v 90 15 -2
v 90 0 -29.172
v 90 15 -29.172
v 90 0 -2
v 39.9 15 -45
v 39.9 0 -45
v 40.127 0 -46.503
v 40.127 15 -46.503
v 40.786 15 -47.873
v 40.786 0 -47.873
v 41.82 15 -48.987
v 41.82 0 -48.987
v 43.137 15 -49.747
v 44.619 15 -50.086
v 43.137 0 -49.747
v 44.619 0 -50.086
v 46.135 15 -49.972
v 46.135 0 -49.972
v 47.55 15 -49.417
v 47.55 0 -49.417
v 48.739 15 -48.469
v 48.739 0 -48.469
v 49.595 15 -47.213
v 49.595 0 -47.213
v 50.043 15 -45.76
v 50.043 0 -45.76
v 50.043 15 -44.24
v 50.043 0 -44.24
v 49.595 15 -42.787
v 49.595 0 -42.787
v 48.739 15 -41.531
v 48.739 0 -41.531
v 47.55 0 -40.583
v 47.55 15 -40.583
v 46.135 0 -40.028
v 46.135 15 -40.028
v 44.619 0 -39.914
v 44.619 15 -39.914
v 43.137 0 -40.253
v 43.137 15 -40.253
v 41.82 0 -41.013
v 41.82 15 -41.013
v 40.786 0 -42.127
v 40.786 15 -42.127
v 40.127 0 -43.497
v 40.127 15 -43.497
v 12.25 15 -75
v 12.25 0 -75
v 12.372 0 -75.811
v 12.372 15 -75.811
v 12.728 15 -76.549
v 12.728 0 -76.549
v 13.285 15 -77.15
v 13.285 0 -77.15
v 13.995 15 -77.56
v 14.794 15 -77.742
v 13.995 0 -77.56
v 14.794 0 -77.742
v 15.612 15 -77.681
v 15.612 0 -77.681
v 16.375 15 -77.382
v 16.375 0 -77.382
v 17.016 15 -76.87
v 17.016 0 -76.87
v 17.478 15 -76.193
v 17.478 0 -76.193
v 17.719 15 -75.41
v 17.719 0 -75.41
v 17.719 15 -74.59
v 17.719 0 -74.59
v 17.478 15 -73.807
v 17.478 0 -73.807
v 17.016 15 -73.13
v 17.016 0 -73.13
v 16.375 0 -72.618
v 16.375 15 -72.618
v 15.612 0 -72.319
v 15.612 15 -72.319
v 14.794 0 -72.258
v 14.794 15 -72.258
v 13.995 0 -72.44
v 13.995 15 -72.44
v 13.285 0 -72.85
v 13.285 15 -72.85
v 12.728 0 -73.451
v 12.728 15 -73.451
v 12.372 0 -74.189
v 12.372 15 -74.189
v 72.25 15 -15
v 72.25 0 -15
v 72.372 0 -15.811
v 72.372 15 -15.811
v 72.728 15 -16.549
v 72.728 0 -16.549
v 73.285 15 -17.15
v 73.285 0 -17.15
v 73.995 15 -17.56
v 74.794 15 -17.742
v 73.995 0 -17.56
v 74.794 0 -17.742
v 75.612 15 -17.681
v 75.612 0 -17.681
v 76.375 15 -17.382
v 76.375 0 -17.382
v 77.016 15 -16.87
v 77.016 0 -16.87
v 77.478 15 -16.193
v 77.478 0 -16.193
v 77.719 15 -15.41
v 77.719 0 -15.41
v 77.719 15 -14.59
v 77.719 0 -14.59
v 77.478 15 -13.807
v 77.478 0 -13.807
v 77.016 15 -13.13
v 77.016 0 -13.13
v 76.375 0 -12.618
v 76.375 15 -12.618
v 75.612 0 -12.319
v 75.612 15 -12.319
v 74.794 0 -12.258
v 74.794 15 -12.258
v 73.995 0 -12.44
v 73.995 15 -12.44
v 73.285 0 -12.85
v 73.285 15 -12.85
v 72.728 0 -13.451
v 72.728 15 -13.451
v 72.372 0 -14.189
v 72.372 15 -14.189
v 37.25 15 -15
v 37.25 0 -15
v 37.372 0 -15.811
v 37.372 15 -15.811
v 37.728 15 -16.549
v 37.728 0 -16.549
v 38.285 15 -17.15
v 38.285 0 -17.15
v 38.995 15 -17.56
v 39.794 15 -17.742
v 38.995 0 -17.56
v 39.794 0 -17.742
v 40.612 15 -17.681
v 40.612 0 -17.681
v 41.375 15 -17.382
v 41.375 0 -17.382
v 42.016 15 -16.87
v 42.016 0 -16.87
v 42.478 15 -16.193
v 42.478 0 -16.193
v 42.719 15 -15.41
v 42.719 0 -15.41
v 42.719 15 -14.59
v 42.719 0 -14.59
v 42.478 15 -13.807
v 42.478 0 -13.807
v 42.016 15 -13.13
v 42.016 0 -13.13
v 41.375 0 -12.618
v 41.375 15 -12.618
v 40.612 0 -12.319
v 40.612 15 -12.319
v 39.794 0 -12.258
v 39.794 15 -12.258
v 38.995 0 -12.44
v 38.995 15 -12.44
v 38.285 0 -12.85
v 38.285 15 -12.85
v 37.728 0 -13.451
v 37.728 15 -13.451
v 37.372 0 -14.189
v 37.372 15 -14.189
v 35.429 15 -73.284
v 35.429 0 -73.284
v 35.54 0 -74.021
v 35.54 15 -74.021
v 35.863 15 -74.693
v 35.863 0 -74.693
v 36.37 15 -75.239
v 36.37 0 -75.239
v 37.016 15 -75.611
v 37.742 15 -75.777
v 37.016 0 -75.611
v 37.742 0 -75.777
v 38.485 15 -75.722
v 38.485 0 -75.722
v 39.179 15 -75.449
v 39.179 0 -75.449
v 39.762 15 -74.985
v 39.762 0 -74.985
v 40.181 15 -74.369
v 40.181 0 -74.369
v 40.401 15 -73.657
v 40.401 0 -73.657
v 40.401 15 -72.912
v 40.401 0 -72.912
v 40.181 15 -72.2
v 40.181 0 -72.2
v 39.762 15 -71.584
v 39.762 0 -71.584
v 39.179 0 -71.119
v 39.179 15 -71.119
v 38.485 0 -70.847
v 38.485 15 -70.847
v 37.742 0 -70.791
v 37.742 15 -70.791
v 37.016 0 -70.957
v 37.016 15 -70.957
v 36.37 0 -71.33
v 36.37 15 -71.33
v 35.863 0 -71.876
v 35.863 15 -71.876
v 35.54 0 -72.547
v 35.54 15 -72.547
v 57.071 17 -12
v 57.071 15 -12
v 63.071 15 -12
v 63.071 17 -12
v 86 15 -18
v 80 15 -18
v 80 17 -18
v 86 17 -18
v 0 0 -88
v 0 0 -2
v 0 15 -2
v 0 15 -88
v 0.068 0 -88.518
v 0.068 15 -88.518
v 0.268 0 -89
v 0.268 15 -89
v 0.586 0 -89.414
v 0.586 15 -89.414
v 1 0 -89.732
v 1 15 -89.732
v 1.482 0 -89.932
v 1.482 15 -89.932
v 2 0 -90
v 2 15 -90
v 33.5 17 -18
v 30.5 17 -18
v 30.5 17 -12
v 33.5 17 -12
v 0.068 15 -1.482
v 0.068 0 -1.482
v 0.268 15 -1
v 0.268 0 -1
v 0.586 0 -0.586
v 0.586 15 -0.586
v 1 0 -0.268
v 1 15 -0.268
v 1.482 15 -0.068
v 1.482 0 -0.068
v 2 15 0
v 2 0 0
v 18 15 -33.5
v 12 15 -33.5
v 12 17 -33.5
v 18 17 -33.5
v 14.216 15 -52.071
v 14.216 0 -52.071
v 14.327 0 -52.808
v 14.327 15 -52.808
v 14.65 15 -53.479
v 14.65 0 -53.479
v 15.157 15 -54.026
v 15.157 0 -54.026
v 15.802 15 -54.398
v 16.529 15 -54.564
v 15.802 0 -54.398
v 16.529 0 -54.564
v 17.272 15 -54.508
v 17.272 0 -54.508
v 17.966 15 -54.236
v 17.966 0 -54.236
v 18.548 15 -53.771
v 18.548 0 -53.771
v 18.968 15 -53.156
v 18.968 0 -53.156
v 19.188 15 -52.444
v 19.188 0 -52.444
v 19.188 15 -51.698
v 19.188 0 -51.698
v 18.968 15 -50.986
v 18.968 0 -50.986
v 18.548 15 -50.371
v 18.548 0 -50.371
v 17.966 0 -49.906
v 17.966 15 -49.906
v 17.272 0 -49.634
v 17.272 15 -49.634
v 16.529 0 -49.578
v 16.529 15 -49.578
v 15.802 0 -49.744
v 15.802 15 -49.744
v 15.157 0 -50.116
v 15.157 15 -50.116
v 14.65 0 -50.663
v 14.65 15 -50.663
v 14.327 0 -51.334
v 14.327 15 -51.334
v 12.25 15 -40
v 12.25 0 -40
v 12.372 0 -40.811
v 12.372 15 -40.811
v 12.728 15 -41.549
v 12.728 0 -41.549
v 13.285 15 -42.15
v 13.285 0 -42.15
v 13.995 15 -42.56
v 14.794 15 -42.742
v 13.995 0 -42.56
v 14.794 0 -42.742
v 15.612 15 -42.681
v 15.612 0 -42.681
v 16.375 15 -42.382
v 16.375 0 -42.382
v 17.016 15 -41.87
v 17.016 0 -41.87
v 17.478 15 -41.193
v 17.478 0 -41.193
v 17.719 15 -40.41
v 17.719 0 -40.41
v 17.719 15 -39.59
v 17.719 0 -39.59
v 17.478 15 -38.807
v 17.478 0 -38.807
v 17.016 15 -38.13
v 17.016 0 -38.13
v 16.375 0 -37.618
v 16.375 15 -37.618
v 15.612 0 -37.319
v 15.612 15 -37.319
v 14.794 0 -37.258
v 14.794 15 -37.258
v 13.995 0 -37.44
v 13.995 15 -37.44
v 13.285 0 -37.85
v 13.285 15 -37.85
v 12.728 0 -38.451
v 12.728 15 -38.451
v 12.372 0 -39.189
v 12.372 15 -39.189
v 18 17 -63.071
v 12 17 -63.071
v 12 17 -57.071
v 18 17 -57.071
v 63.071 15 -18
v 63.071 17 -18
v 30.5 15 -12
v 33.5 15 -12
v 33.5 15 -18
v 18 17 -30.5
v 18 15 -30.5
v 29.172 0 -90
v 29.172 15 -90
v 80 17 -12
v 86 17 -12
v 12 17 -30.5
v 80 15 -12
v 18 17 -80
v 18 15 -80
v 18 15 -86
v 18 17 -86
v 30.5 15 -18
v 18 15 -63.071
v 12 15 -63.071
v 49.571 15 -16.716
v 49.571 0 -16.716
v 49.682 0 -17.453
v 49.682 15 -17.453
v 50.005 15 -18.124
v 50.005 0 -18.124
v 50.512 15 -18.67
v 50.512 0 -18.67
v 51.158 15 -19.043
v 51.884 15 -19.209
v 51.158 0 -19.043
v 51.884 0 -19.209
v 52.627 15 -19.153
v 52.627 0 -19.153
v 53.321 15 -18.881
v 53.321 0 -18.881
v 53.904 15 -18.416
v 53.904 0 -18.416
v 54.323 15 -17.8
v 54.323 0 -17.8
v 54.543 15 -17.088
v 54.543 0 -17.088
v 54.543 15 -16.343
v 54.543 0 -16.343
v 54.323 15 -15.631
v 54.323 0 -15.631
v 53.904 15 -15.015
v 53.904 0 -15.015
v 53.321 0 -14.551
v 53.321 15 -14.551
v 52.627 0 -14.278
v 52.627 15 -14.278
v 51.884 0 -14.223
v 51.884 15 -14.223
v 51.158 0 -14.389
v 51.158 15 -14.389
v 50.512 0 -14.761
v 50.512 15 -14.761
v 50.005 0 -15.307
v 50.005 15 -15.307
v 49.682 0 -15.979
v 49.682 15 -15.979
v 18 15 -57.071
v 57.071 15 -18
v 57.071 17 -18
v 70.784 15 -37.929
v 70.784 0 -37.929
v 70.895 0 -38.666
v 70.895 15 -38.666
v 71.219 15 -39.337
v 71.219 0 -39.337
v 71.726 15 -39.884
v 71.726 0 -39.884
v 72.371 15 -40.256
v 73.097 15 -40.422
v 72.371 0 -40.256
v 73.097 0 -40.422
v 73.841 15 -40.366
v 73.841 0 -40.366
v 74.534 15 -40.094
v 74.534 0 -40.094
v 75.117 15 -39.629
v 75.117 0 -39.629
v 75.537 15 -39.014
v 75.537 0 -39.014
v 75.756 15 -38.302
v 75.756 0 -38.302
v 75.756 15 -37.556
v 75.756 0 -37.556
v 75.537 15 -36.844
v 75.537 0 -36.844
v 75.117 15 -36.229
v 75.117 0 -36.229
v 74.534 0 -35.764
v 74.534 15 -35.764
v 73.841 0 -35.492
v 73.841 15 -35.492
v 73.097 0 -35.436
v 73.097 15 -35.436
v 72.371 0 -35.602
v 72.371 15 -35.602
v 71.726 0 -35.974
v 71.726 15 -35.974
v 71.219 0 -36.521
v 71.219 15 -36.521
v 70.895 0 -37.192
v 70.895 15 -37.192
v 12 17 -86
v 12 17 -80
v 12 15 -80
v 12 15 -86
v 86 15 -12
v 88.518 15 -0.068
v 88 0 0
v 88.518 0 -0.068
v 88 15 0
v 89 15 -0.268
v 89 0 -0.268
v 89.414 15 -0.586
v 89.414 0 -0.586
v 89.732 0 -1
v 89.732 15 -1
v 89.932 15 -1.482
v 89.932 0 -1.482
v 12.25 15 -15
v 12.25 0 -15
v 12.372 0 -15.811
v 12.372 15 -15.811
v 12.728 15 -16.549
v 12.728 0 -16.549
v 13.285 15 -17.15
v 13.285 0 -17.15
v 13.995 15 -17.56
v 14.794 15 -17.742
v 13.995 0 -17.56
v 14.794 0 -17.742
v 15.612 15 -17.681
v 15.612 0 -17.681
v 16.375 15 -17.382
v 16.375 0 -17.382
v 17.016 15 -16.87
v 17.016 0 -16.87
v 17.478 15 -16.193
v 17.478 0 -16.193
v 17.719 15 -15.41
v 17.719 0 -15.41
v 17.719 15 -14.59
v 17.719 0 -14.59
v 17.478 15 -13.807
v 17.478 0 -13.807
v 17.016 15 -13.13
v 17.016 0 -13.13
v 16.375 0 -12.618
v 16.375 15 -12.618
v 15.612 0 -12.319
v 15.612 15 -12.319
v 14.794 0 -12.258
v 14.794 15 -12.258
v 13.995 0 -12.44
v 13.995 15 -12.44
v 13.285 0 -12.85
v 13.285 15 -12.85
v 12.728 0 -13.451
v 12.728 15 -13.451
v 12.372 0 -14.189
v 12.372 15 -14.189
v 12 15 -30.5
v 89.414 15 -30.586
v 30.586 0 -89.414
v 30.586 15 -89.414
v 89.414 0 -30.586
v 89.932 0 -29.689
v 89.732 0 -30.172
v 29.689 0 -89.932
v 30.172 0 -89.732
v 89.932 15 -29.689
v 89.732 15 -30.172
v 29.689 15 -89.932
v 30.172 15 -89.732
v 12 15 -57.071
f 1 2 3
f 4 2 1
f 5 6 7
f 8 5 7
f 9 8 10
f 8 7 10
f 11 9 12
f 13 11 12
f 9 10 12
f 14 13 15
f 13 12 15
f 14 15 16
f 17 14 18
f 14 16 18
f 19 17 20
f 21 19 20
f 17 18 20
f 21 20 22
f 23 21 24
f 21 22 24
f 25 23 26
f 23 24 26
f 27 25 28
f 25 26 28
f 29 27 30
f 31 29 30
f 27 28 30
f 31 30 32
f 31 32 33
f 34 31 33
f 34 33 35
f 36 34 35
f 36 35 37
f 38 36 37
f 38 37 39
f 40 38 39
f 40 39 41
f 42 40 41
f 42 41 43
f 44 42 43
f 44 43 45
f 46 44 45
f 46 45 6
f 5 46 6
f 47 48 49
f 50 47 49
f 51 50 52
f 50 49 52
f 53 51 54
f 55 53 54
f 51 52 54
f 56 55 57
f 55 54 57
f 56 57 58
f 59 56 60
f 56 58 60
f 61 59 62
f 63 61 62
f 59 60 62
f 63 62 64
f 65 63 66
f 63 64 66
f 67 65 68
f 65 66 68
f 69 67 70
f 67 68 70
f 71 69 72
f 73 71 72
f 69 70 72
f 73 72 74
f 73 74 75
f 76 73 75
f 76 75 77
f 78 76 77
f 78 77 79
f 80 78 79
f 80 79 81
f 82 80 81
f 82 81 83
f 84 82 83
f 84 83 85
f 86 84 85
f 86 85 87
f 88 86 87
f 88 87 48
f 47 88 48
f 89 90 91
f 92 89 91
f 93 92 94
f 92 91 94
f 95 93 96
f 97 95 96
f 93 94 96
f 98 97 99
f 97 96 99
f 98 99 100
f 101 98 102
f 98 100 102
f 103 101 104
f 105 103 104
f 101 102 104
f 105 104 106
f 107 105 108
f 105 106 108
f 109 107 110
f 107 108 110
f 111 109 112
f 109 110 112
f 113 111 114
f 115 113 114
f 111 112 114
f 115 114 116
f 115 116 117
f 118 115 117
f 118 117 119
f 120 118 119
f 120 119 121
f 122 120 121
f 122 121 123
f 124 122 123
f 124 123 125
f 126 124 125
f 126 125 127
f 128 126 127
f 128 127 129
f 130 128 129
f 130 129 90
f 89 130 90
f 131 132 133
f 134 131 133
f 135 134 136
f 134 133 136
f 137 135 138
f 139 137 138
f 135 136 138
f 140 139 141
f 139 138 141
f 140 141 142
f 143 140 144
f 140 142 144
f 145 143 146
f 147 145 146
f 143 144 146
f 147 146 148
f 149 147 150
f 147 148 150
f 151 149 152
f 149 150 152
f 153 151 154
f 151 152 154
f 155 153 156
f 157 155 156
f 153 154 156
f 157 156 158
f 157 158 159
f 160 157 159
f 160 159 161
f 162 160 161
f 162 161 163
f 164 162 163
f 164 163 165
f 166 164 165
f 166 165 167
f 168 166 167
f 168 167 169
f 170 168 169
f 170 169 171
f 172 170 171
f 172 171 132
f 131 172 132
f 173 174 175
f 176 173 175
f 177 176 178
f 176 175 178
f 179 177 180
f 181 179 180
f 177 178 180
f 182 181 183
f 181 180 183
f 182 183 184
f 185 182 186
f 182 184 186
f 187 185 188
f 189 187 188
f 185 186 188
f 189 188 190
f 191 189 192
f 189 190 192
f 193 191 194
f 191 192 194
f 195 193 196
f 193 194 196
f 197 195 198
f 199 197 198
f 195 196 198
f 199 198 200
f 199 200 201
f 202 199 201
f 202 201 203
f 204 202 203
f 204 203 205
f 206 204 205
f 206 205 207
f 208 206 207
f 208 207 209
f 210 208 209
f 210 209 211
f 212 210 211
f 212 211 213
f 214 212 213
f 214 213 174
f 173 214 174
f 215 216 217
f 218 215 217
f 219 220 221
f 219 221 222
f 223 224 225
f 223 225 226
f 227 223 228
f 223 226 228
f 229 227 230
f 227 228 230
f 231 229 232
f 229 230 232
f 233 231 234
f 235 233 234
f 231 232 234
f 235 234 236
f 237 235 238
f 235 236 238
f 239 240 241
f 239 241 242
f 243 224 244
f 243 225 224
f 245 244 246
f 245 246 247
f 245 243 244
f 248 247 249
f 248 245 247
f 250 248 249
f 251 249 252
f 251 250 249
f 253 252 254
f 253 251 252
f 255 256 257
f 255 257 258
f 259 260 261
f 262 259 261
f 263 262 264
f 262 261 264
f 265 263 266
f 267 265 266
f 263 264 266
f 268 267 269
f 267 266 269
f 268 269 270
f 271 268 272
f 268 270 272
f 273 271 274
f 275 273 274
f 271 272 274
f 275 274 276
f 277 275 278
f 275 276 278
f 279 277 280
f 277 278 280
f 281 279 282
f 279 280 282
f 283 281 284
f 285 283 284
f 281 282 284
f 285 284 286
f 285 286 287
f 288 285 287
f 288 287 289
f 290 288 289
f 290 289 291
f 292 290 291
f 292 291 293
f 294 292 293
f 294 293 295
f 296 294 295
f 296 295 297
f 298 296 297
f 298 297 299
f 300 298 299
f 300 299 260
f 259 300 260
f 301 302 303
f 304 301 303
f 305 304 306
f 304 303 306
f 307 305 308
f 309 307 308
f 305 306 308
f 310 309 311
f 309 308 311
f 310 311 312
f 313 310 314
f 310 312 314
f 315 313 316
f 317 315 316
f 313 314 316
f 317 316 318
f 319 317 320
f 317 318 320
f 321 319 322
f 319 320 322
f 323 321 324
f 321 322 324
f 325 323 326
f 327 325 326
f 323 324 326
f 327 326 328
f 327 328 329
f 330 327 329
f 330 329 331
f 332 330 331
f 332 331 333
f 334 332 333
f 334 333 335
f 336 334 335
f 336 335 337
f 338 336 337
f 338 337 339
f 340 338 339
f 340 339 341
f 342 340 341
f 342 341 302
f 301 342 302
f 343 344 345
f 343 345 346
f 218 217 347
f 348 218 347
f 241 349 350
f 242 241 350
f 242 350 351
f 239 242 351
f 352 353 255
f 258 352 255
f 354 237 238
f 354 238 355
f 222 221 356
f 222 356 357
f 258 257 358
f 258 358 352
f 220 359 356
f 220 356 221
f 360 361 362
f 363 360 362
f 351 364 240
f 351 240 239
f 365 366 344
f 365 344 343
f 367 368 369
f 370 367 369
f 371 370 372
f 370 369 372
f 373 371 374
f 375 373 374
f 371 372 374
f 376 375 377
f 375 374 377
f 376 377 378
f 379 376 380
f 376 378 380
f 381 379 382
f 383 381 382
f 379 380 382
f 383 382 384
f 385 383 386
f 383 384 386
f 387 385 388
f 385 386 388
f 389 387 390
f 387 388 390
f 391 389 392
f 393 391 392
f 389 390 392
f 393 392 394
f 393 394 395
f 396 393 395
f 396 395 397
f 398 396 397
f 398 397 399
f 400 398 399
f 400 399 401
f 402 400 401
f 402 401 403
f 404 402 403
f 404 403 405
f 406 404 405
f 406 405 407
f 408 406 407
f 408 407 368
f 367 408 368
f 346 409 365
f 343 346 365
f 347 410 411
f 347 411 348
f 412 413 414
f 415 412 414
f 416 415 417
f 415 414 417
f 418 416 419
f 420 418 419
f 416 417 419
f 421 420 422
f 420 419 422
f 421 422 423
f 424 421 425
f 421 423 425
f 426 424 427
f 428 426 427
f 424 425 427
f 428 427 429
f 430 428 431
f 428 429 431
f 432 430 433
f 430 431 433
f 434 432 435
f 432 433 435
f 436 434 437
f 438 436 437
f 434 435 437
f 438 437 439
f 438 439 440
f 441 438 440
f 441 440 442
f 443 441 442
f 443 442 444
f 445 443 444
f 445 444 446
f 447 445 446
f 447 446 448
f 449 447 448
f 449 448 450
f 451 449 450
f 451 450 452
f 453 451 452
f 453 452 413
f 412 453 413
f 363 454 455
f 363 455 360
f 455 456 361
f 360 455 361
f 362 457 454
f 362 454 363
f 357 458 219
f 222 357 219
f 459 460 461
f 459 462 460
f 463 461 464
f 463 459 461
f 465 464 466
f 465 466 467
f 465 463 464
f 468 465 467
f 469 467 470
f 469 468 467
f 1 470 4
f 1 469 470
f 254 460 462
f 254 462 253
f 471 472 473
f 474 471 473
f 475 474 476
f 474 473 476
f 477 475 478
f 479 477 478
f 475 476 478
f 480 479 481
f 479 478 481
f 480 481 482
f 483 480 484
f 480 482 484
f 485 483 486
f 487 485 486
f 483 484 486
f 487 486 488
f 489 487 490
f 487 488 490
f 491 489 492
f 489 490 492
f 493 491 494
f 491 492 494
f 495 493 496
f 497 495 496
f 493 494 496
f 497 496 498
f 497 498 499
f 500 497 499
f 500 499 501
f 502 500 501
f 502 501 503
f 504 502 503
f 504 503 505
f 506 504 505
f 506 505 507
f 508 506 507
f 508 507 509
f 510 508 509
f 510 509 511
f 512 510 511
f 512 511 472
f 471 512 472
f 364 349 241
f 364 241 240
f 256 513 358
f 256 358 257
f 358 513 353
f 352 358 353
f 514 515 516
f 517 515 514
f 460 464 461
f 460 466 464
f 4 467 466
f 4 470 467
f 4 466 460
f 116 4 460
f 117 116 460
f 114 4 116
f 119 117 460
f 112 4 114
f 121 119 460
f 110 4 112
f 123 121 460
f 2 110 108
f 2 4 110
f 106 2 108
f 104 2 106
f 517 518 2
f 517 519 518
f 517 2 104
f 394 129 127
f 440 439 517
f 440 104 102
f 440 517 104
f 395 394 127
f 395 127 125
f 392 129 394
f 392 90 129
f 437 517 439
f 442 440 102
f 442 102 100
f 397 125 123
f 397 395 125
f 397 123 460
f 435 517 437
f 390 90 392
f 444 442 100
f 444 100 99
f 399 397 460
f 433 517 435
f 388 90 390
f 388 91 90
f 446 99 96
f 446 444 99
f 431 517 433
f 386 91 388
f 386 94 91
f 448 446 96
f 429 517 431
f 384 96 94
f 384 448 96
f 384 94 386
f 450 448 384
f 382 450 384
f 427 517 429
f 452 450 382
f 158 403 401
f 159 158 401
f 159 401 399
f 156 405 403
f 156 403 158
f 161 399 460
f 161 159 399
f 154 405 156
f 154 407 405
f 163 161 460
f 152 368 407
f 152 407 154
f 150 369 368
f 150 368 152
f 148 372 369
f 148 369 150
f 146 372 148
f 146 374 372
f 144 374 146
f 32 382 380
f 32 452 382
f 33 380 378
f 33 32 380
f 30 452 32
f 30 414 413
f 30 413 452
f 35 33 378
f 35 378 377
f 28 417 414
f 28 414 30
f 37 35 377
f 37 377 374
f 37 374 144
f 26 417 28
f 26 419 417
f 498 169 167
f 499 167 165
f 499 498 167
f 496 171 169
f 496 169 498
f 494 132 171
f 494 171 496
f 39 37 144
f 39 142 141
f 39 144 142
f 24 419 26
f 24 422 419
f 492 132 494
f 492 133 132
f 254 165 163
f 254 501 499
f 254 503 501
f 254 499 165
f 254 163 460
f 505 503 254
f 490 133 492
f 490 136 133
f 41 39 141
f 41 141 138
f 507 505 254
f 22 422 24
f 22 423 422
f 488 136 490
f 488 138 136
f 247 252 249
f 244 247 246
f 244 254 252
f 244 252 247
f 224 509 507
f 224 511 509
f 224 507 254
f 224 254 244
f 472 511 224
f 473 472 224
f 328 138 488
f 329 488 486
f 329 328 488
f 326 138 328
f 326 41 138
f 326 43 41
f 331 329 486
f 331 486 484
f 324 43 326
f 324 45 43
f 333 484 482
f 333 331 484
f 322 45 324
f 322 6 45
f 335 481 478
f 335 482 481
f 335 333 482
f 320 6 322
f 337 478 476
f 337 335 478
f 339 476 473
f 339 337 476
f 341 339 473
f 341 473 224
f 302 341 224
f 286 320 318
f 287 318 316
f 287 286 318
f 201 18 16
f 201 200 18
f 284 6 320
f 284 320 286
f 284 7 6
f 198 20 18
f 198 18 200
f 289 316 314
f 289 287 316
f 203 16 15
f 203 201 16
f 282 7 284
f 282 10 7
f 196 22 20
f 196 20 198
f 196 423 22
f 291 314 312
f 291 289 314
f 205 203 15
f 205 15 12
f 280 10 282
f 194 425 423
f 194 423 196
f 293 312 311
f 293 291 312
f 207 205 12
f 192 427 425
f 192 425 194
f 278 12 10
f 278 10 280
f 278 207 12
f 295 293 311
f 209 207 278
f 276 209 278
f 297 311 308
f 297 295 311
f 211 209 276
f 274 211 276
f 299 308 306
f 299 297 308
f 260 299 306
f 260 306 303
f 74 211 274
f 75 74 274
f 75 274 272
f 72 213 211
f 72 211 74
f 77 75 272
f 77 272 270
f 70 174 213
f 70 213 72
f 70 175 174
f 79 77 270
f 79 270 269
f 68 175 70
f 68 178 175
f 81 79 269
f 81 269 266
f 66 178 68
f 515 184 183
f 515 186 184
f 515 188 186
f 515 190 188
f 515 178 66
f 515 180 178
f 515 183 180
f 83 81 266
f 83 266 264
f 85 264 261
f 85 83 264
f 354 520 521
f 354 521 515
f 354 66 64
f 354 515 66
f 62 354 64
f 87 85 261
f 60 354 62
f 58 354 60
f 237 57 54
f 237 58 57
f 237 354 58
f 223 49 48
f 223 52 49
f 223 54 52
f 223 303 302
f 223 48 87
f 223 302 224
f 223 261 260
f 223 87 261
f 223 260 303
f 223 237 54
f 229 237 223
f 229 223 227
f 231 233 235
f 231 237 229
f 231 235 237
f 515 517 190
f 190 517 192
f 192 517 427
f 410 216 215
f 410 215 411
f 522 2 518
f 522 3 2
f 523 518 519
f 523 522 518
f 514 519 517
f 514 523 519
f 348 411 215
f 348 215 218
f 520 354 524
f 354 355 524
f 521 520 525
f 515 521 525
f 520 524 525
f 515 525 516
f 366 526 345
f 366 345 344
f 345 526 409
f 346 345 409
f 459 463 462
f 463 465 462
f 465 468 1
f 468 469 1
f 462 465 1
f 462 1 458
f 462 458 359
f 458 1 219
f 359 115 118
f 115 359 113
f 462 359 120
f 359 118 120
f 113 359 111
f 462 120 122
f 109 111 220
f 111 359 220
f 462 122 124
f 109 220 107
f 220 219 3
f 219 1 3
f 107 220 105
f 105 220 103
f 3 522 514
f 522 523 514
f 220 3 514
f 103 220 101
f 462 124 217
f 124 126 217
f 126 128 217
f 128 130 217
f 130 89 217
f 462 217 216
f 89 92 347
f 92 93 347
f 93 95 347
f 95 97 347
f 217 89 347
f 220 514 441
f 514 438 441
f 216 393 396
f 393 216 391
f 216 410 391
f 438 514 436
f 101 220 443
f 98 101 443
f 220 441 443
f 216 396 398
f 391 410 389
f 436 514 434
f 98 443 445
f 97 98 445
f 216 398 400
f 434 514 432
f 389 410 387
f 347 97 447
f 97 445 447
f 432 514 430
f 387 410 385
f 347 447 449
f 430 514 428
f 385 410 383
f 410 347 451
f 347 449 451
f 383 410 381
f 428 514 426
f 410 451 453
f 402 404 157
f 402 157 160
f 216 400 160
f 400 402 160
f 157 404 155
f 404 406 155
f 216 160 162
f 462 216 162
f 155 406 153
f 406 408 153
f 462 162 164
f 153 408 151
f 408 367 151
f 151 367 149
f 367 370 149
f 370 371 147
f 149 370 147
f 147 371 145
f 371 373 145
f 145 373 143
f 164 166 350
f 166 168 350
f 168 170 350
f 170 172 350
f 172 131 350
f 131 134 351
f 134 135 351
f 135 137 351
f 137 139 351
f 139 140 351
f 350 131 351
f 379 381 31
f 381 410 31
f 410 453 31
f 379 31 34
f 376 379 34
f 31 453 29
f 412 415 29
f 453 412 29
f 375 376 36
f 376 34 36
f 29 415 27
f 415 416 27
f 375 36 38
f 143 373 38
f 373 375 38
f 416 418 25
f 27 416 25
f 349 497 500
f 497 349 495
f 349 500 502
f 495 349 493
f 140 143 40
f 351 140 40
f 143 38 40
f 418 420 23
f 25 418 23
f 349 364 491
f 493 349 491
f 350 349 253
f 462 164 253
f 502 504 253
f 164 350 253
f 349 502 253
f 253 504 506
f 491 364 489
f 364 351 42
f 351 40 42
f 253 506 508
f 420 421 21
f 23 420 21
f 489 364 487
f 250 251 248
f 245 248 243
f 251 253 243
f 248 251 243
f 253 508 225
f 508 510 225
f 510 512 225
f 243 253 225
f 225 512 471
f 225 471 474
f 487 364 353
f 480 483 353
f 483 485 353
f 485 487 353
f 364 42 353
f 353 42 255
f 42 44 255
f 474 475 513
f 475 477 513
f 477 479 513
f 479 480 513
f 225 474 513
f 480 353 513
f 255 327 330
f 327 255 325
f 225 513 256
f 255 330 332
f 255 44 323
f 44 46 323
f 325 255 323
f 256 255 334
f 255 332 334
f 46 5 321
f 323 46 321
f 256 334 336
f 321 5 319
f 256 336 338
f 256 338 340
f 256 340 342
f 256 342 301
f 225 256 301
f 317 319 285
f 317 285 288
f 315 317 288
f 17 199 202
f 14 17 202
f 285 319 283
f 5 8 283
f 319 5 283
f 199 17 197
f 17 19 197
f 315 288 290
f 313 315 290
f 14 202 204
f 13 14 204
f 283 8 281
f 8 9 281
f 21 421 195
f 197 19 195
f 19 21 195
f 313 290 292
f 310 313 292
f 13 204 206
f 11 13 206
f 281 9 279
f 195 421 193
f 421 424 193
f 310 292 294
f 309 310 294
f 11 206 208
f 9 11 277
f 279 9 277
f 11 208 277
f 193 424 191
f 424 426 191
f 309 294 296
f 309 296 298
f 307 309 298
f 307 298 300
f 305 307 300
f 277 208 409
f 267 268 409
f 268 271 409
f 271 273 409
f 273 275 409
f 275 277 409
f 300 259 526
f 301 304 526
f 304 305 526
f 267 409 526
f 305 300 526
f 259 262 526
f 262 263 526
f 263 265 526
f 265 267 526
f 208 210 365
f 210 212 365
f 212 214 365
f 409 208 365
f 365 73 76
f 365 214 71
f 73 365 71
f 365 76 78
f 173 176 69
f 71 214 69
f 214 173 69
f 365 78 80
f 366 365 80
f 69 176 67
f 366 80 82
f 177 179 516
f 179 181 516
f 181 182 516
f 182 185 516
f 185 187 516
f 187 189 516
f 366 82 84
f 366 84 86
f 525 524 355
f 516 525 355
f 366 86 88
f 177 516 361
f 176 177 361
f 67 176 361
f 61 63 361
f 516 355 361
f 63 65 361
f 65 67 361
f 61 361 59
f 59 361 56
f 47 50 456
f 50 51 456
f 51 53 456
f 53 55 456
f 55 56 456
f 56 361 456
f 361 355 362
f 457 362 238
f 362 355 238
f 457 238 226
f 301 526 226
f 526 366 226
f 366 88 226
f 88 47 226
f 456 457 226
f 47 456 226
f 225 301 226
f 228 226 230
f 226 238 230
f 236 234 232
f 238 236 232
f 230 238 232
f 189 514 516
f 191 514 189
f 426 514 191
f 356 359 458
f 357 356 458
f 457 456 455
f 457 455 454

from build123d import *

# Parameters (mm, degrees)
EXTRUDE_1_DEPTH             = 15
HOLE_WIZARD_M121_D          = 10.2
HOLE_WIZARD_M121_DEPTH      = 15
HOLE_WIZARD_M61_D           = 5
HOLE_WIZARD_M61_DEPTH       = 15
HOLE_WIZARD_5_5_5_5_1_D     = 5.5
HOLE_WIZARD_5_5_5_5_1_DEPTH = 15
SKETCH_9_W                  = 6
SKETCH_9_H                  = 6
SKETCH_9_H_2                = 3
SKETCH_9_W_2                = 3
EXTRUDE_2_DEPTH             = 2
FILLET_1_R                  = 2


with BuildPart() as part:
    # Эскиз1 → Бобышка-Вытянуть1 (new body)
    with BuildSketch(Plane(origin=(0, 0, 0), x_dir=(1, 0, 0), z_dir=(0, 1, 0))):
        Polygon((0, 0), (0, 90), (30, 90), (90, 30), (90, 0), align=None)
    extrude(amount=EXTRUDE_1_DEPTH)

    # Отверстие обработанное метчиком M121
    with Locations(Plane(origin=(0, 15, 0), x_dir=(1, 0, 0), z_dir=(0, 1, 0))):
        with Locations((45, 45)):
            Hole(HOLE_WIZARD_M121_D / 2, depth=HOLE_WIZARD_M121_DEPTH)

    # Отверстие обработанное метчиком M61
    with Locations(Plane(origin=(0, 15, 0), x_dir=(1, 0, 0), z_dir=(0, 1, 0))):
        with Locations((37.928932188, 73.284271247), (73.284271247, 37.928932188), (52.071067812, 16.715728753), (16.715728753, 52.071067812)):
            Hole(HOLE_WIZARD_M61_D / 2, depth=HOLE_WIZARD_M61_DEPTH)

    # Диаметр отверстия Ø5.5 (5.5)1
    with Locations(Plane(origin=(0, 15, 0), x_dir=(1, 0, 0), z_dir=(0, 1, 0))):
        with Locations((15, 75), (15, 40), (15, 15), (40, 15), (75, 15)):
            Hole(HOLE_WIZARD_5_5_5_5_1_D / 2, depth=HOLE_WIZARD_5_5_5_5_1_DEPTH)

    # Эскиз9 → Бобышка-Вытянуть2 (add)
    with BuildSketch(Plane(origin=(0, 15, 0), x_dir=(1, 0, 0), z_dir=(0, 1, 0))):
        with Locations((15, 83)):
            Rectangle(SKETCH_9_W, SKETCH_9_H)
        with Locations((15, 60.071067812)):
            Rectangle(SKETCH_9_W, SKETCH_9_H)
        with Locations((15, 32)):
            Rectangle(SKETCH_9_W, SKETCH_9_H_2)
        with Locations((32, 15)):
            Rectangle(SKETCH_9_W_2, SKETCH_9_H)
        with Locations((60.071067812, 15)):
            Rectangle(SKETCH_9_W, SKETCH_9_H)
        with Locations((83, 15)):
            Rectangle(SKETCH_9_W, SKETCH_9_H)
    extrude(amount=EXTRUDE_2_DEPTH)

    # Скругление1
    fillet_1_edges = [part.edges().sort_by_distance(p)[0] for p in [
        (0, 7.5, 0),
        (0, 7.5, -90),
        (30, 7.5, -90),
        (90, 7.5, -30),
        (90, 7.5, 0),
    ]]
    fillet(fillet_1_edges, radius=FILLET_1_R)


solid = part.part
